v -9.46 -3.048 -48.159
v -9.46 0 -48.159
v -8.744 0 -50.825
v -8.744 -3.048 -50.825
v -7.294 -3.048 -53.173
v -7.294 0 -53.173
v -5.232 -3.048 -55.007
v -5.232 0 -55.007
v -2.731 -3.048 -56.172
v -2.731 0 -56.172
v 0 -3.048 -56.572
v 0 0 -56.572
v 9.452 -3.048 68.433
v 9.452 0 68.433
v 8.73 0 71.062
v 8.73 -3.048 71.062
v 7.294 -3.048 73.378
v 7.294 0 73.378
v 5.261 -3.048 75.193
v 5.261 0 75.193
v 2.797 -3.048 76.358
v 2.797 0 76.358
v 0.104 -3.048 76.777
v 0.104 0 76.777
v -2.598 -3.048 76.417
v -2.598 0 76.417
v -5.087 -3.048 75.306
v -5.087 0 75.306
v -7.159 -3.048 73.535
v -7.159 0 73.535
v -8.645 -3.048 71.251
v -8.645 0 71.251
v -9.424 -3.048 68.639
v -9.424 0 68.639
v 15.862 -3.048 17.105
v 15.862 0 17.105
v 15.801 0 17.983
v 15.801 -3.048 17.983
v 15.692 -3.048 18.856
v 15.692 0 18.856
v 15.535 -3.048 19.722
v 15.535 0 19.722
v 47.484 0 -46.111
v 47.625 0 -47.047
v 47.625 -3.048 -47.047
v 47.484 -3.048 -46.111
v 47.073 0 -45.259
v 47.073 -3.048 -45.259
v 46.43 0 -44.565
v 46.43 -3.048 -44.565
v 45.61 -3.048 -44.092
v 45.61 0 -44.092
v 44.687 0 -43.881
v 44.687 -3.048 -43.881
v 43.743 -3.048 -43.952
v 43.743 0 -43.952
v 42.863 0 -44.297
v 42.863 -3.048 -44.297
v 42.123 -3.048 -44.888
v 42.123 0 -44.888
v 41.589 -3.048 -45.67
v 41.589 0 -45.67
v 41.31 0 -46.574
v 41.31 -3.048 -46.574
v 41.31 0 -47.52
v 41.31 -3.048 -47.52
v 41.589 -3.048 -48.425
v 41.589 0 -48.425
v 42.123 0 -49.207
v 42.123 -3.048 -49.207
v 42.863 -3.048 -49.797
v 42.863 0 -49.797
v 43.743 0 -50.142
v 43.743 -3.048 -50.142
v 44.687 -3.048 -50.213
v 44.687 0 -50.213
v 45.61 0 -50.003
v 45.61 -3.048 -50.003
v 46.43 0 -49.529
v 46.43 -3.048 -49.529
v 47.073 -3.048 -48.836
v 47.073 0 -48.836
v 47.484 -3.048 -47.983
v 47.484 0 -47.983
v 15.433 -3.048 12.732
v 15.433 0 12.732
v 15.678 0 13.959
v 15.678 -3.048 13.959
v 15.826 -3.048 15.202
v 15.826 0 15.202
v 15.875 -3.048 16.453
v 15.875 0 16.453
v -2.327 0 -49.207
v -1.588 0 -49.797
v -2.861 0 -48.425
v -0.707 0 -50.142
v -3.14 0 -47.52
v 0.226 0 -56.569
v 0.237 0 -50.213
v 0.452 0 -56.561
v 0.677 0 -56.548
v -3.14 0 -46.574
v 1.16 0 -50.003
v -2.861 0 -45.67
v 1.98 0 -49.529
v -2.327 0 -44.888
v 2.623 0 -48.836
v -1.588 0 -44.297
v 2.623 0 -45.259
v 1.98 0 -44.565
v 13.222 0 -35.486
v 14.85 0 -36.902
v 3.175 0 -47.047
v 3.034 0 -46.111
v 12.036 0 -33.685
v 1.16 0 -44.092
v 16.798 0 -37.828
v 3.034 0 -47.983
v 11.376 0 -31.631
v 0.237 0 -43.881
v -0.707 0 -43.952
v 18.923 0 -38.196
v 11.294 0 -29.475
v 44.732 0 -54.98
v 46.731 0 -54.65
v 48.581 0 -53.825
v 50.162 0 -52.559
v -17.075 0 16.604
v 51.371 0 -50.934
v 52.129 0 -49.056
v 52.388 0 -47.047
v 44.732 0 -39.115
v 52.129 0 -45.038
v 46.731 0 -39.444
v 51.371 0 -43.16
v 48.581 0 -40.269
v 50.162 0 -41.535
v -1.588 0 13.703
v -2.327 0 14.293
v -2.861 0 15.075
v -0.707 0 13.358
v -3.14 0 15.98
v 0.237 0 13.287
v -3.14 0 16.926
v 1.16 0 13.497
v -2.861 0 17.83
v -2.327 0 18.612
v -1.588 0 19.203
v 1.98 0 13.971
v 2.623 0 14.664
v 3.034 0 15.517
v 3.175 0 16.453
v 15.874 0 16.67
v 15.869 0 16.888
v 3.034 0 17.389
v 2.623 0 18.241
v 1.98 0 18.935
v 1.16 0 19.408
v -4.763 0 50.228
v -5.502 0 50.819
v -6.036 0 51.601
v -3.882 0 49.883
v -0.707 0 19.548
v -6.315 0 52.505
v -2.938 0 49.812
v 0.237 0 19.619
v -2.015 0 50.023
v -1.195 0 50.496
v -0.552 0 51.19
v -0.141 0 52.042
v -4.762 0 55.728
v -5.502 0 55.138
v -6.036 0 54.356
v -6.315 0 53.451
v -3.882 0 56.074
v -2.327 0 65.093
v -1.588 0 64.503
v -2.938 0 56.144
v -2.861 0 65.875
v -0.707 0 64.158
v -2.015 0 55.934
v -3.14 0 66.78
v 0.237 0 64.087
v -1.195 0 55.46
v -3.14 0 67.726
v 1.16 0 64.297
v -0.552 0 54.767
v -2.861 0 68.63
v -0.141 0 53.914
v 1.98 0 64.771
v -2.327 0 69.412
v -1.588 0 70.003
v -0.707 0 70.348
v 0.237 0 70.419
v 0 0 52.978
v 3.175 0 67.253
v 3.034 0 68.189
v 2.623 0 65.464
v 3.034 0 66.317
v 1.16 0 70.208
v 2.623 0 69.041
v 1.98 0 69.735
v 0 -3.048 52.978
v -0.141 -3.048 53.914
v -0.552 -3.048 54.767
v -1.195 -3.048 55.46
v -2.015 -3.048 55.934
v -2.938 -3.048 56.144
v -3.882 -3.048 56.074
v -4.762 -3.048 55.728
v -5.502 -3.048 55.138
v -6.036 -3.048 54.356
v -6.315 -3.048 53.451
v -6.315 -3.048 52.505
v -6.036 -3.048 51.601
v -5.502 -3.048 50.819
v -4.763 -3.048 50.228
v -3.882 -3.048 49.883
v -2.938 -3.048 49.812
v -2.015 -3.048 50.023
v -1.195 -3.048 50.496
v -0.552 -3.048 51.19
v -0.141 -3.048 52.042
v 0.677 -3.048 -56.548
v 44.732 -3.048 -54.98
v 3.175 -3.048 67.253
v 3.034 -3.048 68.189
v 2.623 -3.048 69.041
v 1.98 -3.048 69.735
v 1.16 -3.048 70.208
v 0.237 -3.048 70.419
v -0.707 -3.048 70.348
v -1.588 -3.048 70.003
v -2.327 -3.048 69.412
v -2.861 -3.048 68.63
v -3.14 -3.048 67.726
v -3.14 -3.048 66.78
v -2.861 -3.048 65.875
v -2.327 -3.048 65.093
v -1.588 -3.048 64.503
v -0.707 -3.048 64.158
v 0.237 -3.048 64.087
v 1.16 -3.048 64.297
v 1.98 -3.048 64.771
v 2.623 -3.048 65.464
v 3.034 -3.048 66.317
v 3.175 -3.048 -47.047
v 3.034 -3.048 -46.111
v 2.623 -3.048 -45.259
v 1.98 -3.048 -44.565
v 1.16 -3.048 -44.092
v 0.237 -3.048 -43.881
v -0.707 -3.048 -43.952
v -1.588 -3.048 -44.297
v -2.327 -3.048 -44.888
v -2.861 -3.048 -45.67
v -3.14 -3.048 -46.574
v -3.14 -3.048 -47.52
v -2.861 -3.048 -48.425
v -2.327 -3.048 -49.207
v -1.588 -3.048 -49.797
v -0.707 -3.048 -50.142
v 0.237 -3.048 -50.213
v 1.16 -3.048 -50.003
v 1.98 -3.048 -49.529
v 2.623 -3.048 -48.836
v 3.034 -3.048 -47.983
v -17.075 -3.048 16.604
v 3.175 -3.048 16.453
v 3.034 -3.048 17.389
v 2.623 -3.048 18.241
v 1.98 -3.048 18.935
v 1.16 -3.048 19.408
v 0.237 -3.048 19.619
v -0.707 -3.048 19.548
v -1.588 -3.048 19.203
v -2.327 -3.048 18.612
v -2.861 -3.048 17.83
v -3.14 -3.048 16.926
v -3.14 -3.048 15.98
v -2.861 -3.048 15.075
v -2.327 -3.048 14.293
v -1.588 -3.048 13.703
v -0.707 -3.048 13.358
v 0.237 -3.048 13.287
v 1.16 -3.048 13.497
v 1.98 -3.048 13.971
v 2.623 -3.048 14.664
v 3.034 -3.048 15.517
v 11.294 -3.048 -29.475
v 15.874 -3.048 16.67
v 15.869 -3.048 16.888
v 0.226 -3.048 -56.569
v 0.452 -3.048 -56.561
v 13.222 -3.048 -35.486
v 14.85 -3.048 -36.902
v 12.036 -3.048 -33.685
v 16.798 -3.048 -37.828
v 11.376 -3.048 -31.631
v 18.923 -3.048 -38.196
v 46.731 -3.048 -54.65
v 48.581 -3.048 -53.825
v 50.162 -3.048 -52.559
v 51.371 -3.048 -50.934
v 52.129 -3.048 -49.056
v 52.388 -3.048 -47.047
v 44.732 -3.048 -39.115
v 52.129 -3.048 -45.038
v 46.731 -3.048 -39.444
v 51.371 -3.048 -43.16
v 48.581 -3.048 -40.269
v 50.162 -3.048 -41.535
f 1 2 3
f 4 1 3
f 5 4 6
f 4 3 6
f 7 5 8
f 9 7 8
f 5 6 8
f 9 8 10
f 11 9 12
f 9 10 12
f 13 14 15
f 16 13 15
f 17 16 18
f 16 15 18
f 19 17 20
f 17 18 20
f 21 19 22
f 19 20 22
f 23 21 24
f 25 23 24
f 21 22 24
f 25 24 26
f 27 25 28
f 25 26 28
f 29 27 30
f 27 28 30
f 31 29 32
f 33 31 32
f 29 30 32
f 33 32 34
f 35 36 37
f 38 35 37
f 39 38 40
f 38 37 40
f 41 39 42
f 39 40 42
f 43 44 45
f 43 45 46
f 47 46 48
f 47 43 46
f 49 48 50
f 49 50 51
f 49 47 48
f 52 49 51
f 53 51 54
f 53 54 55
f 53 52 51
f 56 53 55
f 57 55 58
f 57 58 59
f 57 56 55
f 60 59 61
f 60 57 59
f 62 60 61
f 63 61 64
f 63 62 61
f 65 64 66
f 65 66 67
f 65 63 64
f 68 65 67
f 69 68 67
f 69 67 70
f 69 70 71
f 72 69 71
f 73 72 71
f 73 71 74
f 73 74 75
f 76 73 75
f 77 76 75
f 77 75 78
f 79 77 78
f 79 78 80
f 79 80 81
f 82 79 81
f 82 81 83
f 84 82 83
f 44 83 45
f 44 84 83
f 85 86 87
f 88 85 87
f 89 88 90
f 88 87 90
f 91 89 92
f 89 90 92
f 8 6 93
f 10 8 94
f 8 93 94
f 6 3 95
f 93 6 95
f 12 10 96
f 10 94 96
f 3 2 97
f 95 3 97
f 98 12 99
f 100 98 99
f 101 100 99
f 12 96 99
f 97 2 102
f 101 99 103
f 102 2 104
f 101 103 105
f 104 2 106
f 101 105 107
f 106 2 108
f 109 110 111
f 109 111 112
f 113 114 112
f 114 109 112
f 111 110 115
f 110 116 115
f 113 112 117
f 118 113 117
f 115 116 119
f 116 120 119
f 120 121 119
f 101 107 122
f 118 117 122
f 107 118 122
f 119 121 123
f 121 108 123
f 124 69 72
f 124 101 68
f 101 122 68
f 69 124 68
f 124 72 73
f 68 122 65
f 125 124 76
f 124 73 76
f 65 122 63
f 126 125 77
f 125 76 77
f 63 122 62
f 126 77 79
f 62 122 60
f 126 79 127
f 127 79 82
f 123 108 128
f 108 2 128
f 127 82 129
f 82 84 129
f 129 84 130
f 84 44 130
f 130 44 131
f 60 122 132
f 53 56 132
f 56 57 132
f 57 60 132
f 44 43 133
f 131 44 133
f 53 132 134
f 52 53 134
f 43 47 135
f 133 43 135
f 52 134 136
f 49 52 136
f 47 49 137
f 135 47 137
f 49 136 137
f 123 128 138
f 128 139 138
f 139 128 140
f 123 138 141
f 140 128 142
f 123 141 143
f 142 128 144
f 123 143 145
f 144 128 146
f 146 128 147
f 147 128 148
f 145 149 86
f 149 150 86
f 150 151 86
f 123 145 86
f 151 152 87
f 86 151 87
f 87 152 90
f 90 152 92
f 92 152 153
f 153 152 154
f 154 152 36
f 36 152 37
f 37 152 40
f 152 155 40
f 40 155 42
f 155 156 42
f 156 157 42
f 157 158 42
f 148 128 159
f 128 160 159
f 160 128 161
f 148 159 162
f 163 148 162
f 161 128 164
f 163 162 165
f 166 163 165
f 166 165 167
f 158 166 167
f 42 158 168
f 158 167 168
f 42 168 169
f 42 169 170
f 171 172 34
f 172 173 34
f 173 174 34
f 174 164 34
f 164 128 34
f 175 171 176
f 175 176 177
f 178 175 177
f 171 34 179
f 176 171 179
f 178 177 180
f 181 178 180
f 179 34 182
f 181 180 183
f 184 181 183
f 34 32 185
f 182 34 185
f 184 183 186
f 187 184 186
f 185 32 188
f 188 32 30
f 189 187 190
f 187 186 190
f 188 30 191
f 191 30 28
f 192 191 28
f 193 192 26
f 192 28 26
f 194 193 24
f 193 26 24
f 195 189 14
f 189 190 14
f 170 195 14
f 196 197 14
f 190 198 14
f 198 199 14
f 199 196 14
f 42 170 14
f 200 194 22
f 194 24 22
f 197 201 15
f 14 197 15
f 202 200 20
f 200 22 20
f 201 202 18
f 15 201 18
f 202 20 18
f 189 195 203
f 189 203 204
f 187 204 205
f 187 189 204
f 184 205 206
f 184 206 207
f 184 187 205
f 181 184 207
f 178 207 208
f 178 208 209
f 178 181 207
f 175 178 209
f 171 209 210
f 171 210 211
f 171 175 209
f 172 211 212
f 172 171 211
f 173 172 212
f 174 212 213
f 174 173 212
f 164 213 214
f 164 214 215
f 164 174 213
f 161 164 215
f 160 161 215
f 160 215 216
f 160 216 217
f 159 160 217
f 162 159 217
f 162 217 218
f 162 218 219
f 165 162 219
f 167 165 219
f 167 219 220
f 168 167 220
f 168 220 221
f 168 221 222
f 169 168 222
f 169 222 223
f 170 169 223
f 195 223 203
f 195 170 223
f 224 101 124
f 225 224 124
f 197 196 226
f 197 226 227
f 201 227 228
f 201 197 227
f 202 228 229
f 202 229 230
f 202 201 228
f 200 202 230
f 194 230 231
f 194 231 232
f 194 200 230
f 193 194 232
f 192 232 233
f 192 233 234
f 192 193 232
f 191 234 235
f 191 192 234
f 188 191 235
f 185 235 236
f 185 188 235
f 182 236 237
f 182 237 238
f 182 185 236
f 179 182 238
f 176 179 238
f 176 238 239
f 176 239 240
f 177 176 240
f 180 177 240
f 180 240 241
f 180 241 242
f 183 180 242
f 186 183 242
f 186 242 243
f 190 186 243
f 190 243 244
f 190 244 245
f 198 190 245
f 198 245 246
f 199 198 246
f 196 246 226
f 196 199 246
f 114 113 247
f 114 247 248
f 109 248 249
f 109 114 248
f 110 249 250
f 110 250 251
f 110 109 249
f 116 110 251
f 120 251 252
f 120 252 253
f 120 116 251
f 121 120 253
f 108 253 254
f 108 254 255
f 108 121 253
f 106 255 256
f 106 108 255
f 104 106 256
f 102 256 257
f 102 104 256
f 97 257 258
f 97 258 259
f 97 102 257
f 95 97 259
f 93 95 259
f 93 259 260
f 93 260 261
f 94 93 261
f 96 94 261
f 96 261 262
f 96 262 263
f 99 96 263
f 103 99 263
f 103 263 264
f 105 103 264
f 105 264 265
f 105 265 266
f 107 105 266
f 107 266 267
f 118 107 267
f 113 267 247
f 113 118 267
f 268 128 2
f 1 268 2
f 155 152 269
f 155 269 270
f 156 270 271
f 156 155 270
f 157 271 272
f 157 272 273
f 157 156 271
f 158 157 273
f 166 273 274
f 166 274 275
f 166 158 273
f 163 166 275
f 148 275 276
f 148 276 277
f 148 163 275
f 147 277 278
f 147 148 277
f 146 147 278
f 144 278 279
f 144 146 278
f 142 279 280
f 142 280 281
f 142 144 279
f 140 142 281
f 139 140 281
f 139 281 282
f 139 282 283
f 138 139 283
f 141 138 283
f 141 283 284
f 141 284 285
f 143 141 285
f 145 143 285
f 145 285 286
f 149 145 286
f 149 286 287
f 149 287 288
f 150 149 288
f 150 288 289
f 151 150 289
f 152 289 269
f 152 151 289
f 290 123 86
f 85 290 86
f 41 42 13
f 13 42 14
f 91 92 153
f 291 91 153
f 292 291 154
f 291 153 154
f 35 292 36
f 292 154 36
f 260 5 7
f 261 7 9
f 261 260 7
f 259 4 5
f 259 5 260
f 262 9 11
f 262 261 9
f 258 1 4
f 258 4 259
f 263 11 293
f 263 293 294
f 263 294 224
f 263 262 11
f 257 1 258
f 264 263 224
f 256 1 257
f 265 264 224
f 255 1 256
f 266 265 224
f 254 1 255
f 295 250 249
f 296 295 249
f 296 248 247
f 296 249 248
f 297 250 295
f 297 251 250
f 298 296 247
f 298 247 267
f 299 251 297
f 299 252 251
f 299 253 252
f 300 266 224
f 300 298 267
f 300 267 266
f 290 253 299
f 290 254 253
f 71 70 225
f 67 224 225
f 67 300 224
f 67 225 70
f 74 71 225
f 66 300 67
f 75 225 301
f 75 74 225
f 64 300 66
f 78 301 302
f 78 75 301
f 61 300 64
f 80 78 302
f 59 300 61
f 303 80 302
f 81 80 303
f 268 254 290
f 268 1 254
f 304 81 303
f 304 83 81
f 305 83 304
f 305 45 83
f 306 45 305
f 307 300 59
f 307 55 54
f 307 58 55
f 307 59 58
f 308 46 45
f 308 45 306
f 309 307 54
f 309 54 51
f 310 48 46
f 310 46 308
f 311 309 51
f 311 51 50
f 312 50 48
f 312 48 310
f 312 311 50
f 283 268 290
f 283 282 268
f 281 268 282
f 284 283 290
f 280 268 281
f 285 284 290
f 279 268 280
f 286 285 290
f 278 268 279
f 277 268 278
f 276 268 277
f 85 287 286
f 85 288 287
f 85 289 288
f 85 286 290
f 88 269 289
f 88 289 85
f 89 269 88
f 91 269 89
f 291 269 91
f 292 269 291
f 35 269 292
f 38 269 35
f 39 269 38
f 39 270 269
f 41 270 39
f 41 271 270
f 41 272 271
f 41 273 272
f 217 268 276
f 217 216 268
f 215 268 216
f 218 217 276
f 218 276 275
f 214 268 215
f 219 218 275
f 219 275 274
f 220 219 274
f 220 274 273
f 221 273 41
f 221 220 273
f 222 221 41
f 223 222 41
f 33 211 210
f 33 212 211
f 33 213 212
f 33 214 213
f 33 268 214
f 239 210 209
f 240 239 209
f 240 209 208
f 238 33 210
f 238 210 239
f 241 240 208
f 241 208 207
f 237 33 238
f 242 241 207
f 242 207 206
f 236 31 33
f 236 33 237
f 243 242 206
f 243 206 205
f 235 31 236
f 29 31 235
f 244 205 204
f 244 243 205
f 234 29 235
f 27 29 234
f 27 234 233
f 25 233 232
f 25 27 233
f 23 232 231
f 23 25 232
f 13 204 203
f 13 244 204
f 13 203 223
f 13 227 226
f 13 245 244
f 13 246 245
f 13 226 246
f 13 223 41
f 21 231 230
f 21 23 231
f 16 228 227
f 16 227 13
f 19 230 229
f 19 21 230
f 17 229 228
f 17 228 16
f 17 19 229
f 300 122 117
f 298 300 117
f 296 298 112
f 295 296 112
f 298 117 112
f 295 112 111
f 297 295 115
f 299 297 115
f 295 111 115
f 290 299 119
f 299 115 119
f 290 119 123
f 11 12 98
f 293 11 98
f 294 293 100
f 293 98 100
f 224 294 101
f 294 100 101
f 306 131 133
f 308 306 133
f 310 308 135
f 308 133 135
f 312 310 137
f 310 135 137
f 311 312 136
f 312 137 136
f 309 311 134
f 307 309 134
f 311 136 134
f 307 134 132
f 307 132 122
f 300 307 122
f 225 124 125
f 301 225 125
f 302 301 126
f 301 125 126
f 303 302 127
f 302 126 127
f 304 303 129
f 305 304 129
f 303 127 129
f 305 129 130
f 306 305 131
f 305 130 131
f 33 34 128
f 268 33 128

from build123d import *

# Parameters (mm, degrees)
F0_R     = 3.175
F1_DEPTH = 3.048


with BuildPart() as f1:
    # F0 (on Front) → F1 (new body)
    with BuildSketch(Plane.XZ):
        with BuildLine():
            ThreePointArc((-9.4236638917, 68.6386150491), (-0.6947036893, 57.753275869), (9.525, 67.252908061))
            ThreePointArc((9.525, 67.252908061), (9.5066279666, 67.8442199118), (9.4515827392, 68.4332506914))
            ThreePointArc((9.4515827392, 68.4332506914), (0.1036267117, 76.7773443438), (-9.4236638917, 68.6386150491))
        make_face()
        with Locations((0, 67.252908061)):
            Circle(F0_R, mode=Mode.SUBTRACT)
        with BuildLine():
            ThreePointArc((9.4515827392, 68.4332506914), (9.5066279666, 67.8442199118), (9.525, 67.252908061))
            ThreePointArc((9.525, 67.252908061), (-0.6947036893, 57.753275869), (-9.4236638917, 68.6386150491))
            Line((-9.4236638917, 68.6386150491), (-17.0751139076, 16.6040263124))
            Line((-17.0751139076, 16.6040263124), (-9.4598263283, -48.1594366871))
            ThreePointArc((-9.4598263283, -48.1594366871), (-0.5571262079, -37.5383993165), (9.525, -47.047091939))
            ThreePointArc((9.525, -47.047091939), (6.9705567315, -53.5383910272), (0.6773435479, -56.5479777249))
            Line((0.6773435479, -56.5479777249), (44.7324052746, -54.9795665535))
            ThreePointArc((44.7324052746, -54.9795665535), (36.5125000006, -47.0471928378), (44.7322036046, -39.1146101473))
            Line((44.7322036046, -39.1146101473), (18.9234018404, -38.1964439189))
            ThreePointArc((18.9234018404, -38.1964439189), (13.2224661173, -35.485992741), (11.2938088242, -29.4753775685))
            Line((11.2938088242, -29.4753775685), (15.4327477068, 12.7318970133))
            ThreePointArc((15.4327477068, 12.7318970133), (-15.8733066778, 16.6847703328), (15.5348463028, 19.7215737442))
            Line((15.5348463028, 19.7215737442), (9.4515827392, 68.4332506914))
        make_face()
        with Locations((-3.175, 52.978108061)):
            Circle(F0_R, mode=Mode.SUBTRACT)
        with BuildLine():
            Line((15.8615962708, 17.1051263858), (15.5348463028, 19.7215737442))
            ThreePointArc((15.5348463028, 19.7215737442), (-15.8733066778, 16.6847703328), (15.4327477068, 12.7318970133))
            Line((15.4327477068, 12.7318970133), (15.8615962708, 17.1051263858))
        make_face()
        with Locations((0, 16.452908061)):
            Circle(F0_R, mode=Mode.SUBTRACT)
        with BuildLine():
            ThreePointArc((15.8615962708, 17.1051263858), (15.7526378986, 18.4201457783), (15.5348463028, 19.7215737442))
            Line((15.5348463028, 19.7215737442), (15.8615962708, 17.1051263858))
        make_face()
        with BuildLine():
            ThreePointArc((15.875, 16.452908061), (15.871648714, 16.7790860811), (15.8615962708, 17.1051263858))
            Line((15.8615962708, 17.1051263858), (15.4327477068, 12.7318970133))
            ThreePointArc((15.4327477068, 12.7318970133), (15.7640492077, 14.5793078964), (15.875, 16.452908061))
        make_face()
        with BuildLine():
            ThreePointArc((9.525, -47.047091939), (-0.5571262079, -37.5383993165), (-9.4598263283, -48.1594366871))
            ThreePointArc((-9.4598263283, -48.1594366871), (-6.329713314, -54.1647006921), (0, -56.572091939))
            Line((0, -56.572091939), (0.6773435479, -56.5479777249))
            ThreePointArc((0.6773435479, -56.5479777249), (6.9705567315, -53.5383910272), (9.525, -47.047091939))
        make_face()
        with Locations((0, -47.047091939)):
            Circle(F0_R, mode=Mode.SUBTRACT)
        with BuildLine():
            Line((0.6773435479, -56.5479777249), (0, -56.572091939))
            ThreePointArc((0, -56.572091939), (0.3388863295, -56.5660614764), (0.6773435479, -56.5479777249))
        make_face()
        with BuildLine():
            ThreePointArc((52.3875, -47.047091939), (50.1615627179, -41.5351088503), (44.7322036046, -39.1146101473))
            ThreePointArc((44.7322036046, -39.1146101473), (36.5125000006, -47.0471928378), (44.7324052746, -54.9795665535))
            ThreePointArc((44.7324052746, -54.9795665535), (50.1616327839, -52.5590024237), (52.3875, -47.047091939))
        make_face()
        with Locations((44.45, -47.047091939)):
            Circle(F0_R, mode=Mode.SUBTRACT)
    extrude(amount=F1_DEPTH)


solid = f1.part
